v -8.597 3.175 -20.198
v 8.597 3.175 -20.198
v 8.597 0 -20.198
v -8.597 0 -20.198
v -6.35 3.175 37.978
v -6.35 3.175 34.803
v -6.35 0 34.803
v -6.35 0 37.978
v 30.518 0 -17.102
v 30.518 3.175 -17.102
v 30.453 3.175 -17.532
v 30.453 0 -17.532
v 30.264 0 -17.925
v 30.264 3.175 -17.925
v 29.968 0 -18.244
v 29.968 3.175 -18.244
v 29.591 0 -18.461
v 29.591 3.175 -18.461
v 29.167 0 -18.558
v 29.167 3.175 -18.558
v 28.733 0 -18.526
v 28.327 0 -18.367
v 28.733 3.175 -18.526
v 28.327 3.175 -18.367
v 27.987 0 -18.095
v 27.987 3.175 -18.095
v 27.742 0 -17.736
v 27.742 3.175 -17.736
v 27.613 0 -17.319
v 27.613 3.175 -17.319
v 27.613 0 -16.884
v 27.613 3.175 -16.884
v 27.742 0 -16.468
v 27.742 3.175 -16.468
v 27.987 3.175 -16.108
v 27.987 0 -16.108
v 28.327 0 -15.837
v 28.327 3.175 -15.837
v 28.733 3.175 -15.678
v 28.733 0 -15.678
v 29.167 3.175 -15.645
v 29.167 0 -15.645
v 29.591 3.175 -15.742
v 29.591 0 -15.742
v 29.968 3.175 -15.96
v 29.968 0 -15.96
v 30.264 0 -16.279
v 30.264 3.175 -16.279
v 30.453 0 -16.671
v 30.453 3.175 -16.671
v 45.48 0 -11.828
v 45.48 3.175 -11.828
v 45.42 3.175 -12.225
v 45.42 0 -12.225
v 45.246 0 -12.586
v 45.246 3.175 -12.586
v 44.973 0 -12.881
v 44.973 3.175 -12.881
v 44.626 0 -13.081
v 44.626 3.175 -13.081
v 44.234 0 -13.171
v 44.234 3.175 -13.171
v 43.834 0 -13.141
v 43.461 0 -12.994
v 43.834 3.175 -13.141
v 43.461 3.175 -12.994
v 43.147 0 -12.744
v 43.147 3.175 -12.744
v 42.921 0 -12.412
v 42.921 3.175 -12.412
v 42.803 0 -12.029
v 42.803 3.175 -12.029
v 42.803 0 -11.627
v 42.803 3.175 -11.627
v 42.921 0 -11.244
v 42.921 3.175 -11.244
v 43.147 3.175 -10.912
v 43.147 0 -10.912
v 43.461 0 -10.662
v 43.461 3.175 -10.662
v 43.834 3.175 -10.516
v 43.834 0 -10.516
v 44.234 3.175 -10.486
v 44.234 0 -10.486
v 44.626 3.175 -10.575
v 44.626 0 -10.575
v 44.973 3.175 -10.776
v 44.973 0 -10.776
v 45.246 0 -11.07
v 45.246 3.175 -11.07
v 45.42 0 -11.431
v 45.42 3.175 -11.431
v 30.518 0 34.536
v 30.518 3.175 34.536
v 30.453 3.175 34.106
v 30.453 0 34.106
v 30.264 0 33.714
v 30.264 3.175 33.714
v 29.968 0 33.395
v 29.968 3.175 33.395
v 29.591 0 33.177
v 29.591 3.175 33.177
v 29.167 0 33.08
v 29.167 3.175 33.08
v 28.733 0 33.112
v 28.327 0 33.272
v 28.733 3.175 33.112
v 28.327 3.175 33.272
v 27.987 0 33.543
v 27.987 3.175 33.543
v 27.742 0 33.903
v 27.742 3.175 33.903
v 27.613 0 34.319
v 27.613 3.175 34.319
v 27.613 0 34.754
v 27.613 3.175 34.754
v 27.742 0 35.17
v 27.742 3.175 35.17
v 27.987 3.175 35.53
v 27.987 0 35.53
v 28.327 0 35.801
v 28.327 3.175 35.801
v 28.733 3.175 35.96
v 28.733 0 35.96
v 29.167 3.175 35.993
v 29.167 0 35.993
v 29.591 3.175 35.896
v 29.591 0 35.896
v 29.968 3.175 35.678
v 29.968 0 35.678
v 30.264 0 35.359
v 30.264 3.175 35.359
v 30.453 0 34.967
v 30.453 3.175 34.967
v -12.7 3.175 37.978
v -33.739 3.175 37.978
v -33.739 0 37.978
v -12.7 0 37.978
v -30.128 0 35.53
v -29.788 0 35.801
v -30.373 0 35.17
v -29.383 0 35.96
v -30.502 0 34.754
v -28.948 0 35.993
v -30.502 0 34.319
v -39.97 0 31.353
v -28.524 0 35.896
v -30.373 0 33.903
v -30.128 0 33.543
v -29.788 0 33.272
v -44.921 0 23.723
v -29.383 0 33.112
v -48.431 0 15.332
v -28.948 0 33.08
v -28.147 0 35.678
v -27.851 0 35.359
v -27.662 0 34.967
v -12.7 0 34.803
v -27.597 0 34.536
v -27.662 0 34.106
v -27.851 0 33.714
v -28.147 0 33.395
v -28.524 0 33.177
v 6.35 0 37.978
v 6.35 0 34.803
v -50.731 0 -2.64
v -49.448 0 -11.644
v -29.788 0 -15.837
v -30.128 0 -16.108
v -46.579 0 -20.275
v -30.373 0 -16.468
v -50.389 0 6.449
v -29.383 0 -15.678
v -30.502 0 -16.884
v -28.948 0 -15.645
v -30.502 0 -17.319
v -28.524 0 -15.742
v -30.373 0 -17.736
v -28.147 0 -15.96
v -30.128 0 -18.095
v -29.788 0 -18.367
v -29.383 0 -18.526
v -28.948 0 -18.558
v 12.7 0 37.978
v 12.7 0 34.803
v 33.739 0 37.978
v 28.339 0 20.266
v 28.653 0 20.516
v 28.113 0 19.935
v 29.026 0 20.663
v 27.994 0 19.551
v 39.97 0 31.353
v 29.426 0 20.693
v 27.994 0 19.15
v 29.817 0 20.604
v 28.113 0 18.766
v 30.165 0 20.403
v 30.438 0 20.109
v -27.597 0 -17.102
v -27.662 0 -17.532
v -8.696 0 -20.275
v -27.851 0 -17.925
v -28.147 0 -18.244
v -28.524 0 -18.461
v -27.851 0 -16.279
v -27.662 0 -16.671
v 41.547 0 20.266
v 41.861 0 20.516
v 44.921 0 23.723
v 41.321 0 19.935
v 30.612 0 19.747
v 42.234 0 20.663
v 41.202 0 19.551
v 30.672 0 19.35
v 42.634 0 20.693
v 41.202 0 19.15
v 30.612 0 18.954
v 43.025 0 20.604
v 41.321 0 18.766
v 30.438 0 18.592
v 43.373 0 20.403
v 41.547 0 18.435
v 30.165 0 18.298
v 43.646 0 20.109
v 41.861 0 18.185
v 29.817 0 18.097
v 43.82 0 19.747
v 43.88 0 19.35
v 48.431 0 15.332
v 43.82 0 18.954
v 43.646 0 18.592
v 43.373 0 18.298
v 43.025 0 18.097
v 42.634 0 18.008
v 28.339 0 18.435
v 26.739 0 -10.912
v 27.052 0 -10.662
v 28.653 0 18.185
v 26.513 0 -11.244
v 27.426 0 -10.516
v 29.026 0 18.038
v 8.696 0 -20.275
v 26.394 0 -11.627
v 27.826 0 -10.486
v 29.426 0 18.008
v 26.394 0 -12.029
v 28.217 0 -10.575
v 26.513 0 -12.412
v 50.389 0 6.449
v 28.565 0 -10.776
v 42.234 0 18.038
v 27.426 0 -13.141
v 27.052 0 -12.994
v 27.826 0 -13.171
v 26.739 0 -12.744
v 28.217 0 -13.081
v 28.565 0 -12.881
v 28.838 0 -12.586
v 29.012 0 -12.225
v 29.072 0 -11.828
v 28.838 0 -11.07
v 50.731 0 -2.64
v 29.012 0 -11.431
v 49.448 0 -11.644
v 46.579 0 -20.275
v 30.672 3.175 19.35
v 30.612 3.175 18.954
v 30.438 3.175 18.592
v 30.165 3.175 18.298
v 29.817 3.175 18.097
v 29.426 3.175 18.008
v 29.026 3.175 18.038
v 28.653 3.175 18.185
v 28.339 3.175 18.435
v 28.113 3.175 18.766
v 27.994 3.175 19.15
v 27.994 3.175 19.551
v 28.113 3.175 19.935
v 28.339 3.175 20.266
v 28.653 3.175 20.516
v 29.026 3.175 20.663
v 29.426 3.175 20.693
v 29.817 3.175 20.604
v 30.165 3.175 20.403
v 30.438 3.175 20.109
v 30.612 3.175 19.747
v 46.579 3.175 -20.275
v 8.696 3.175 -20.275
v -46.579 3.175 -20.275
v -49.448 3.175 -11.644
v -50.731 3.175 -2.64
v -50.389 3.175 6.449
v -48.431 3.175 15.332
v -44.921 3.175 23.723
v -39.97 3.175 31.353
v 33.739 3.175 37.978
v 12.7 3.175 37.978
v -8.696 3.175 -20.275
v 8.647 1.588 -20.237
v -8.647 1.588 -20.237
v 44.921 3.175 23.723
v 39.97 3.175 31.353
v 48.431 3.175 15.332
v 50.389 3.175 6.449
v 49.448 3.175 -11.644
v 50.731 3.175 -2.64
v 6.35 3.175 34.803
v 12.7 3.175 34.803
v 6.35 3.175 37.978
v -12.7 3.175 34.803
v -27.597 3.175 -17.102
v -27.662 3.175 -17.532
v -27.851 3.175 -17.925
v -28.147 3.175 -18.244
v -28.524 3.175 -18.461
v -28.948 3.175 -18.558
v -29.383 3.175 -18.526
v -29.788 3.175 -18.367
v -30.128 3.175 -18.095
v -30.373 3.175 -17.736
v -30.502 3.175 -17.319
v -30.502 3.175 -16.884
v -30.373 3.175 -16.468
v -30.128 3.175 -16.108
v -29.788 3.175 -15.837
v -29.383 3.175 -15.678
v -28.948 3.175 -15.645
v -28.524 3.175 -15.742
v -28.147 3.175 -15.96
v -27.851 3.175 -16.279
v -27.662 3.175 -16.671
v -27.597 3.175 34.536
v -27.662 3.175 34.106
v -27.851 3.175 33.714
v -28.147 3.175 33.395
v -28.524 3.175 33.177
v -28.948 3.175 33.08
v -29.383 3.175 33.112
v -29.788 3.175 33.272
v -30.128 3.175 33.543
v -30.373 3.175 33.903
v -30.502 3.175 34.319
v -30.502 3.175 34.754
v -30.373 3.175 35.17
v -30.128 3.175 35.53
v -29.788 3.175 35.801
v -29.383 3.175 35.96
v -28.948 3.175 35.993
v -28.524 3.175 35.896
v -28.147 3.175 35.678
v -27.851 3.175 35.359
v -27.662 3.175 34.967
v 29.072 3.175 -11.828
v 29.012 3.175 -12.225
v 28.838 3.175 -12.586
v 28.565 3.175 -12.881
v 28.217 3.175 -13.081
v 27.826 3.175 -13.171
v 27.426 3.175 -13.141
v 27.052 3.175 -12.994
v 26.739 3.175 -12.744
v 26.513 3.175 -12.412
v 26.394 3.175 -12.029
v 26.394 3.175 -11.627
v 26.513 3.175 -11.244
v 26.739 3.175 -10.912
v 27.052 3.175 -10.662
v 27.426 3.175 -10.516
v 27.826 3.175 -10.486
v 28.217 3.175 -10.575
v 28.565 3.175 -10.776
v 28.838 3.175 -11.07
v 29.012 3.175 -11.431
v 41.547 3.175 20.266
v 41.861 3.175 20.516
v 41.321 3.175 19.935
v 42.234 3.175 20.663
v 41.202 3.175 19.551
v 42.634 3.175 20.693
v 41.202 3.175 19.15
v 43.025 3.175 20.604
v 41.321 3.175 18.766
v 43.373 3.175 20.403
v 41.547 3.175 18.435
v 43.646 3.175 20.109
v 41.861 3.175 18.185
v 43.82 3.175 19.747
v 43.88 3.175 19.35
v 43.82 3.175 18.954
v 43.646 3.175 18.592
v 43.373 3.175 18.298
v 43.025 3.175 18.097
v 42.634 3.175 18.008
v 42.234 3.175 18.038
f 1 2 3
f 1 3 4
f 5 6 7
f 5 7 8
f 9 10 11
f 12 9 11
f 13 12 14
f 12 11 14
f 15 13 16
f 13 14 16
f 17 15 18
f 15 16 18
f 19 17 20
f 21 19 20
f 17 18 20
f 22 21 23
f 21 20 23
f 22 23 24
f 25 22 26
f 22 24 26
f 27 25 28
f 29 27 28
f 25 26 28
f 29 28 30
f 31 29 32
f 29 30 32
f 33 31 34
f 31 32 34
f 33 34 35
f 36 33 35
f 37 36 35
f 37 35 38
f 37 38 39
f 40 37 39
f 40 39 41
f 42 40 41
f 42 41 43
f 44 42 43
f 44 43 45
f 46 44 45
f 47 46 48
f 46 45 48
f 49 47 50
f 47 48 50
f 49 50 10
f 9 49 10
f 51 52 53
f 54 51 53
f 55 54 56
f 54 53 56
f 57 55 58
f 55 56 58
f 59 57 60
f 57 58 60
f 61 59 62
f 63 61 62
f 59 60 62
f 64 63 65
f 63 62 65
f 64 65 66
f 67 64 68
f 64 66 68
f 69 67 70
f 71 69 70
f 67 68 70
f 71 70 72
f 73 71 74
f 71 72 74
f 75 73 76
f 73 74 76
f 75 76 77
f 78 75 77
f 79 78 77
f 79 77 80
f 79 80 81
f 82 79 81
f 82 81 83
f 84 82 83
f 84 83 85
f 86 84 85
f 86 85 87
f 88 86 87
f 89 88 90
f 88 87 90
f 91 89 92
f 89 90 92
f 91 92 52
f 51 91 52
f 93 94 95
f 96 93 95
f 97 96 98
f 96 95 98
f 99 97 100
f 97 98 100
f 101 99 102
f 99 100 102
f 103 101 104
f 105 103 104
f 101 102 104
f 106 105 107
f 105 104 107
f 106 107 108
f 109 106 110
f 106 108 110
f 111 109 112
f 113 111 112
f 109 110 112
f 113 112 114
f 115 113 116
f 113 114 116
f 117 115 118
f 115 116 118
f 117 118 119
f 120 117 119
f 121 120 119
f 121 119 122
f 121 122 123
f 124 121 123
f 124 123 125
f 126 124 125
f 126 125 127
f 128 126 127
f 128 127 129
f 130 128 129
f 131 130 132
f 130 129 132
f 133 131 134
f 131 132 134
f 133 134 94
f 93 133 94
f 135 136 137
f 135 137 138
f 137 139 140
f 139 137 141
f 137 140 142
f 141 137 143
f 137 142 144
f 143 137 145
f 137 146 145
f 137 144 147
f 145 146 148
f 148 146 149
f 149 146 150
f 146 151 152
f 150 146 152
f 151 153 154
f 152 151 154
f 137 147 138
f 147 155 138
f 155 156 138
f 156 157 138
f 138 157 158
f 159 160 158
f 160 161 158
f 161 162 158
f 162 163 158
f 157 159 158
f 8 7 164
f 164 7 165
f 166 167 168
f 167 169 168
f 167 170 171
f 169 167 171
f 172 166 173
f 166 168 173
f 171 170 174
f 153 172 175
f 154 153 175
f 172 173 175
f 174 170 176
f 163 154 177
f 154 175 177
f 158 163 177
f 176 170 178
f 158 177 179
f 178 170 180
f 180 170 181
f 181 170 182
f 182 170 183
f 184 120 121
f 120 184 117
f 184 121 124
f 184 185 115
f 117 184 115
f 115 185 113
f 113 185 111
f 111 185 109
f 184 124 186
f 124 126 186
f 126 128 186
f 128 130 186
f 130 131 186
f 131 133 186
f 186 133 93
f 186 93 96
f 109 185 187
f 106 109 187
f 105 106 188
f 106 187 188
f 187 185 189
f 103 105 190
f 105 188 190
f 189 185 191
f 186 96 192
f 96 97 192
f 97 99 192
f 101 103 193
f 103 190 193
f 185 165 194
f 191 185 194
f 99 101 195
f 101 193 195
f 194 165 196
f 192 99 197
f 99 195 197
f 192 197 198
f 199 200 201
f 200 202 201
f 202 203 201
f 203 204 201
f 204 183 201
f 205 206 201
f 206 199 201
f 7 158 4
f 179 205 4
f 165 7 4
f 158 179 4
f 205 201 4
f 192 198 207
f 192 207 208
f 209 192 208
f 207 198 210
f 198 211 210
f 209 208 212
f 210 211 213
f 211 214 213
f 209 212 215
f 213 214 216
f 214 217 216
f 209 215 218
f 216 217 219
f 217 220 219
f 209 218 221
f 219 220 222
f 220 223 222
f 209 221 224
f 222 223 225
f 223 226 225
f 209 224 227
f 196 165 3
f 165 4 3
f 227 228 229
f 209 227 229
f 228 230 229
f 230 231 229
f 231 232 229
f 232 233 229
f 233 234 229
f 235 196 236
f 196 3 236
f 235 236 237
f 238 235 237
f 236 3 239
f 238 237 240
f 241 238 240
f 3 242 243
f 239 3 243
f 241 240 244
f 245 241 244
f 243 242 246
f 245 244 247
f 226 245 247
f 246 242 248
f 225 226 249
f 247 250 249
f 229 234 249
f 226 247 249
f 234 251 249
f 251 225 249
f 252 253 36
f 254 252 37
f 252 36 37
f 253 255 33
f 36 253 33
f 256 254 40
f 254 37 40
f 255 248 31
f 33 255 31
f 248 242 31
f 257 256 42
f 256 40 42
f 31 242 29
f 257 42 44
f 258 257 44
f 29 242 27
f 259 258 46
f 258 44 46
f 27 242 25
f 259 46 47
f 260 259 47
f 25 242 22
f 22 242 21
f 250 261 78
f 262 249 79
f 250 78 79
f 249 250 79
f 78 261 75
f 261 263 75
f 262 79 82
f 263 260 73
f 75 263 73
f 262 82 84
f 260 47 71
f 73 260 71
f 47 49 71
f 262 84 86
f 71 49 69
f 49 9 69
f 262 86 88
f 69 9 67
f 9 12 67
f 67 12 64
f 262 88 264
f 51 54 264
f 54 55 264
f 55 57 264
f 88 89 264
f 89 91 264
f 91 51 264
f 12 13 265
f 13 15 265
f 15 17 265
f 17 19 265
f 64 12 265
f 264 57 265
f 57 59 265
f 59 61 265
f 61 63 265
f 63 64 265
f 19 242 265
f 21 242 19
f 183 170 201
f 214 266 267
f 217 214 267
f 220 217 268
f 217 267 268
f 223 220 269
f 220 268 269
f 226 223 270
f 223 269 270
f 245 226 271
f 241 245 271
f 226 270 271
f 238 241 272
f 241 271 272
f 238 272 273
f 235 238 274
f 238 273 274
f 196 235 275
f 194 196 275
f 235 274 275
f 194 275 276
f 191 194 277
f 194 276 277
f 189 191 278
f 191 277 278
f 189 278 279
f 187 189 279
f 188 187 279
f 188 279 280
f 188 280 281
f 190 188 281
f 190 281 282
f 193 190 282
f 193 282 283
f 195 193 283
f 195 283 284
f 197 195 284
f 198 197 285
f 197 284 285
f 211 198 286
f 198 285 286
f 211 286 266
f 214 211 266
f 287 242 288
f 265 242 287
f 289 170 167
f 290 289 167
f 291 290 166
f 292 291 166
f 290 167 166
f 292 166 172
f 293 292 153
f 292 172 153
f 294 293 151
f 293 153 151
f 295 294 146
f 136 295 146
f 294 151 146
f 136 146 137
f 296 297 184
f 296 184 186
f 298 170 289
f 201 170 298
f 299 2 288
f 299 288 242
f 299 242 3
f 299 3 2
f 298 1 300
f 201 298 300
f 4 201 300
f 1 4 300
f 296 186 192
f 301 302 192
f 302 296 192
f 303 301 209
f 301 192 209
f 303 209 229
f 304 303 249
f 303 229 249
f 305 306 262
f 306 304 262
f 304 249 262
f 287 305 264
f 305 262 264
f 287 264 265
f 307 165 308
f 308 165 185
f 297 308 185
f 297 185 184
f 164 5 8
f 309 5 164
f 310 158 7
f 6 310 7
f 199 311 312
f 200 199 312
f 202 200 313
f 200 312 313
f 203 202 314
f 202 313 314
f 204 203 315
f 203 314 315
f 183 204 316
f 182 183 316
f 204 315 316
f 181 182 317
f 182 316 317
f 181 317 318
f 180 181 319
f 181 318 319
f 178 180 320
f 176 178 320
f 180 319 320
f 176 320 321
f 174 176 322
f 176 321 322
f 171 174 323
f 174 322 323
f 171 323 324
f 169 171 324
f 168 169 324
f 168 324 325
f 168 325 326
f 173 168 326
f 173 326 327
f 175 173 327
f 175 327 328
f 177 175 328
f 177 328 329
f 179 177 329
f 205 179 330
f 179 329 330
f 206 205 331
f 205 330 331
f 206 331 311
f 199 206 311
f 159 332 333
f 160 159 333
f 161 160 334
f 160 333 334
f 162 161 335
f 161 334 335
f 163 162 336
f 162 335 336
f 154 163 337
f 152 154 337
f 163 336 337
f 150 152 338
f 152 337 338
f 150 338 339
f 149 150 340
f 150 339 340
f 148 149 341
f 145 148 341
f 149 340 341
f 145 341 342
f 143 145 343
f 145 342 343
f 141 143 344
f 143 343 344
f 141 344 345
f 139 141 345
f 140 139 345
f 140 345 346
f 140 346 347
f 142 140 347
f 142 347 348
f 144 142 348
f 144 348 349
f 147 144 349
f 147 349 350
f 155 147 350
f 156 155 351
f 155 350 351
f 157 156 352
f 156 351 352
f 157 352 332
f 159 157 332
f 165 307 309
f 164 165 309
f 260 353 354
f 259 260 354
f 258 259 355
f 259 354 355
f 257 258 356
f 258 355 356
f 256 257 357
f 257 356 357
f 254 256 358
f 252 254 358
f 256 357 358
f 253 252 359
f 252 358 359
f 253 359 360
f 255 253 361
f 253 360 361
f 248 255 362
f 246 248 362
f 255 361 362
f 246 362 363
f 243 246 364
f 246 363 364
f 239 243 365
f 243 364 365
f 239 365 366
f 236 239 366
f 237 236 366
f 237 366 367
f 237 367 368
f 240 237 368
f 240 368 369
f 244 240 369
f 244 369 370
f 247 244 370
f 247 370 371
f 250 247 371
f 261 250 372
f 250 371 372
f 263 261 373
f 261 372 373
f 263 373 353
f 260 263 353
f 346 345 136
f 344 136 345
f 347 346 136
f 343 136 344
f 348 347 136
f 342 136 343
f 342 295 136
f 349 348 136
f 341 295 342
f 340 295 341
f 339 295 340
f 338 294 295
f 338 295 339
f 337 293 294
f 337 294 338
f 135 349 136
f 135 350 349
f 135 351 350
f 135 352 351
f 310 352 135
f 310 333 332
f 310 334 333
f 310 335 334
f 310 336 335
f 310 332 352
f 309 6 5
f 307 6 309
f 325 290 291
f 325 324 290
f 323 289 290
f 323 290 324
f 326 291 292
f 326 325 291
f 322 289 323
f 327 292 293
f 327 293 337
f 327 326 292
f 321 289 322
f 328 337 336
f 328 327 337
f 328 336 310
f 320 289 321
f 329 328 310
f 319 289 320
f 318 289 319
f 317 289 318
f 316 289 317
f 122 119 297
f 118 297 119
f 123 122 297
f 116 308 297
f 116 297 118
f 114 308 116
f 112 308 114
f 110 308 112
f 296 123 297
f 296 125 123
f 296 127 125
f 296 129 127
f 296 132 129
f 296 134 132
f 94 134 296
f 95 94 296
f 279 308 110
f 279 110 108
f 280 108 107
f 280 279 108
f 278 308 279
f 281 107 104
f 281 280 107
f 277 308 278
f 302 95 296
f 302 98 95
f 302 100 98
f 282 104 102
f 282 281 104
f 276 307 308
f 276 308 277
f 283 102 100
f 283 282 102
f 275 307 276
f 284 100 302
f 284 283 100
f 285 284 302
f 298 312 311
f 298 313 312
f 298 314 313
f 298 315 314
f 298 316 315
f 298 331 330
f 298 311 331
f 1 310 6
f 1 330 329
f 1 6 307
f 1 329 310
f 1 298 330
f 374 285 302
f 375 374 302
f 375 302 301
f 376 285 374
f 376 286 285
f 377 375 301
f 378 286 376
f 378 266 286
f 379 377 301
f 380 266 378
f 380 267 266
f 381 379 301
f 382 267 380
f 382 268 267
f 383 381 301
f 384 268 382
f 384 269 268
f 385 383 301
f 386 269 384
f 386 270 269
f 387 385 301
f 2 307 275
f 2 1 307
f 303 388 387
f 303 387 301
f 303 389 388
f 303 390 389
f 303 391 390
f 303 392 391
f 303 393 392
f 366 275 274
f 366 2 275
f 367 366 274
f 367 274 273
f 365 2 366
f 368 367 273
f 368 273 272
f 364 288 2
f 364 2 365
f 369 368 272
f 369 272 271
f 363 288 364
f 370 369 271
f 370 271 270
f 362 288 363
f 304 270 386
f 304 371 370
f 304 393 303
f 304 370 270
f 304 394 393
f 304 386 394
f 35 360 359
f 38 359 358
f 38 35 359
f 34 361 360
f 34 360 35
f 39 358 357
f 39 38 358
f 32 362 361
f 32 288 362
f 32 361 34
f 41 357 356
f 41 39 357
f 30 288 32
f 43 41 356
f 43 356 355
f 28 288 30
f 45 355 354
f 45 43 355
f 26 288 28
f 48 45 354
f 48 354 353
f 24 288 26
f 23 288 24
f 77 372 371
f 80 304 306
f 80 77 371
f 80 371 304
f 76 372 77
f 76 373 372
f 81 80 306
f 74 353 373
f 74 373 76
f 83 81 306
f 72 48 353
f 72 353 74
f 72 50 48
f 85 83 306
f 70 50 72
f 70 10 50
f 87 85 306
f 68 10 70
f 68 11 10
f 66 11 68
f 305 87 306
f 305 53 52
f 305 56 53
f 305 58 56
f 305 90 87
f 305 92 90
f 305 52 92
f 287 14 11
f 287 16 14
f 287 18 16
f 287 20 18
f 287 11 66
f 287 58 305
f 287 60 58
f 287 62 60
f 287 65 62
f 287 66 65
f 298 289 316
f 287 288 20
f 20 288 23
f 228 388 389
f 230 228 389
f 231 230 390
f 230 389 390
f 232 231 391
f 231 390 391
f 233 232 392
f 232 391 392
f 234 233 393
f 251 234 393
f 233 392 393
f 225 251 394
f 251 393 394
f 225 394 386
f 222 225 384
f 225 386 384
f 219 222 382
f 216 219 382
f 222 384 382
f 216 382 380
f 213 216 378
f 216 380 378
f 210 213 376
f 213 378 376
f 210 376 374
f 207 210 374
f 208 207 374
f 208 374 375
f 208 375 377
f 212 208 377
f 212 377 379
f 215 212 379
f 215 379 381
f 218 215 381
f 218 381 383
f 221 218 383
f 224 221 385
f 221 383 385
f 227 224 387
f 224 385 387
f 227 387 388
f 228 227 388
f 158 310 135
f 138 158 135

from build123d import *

# Parameters (mm, degrees)
SKETCH1_R           = 50.8
BOSS_EXTRUDE1_DEPTH = 3.175
SKETCH2_W           = 114.887790664
SKETCH2_H           = 17.737062418
CUT_EXTRUDE1_DEPTH  = 3.175
SKETCH6_R           = 1.4605
CUT_EXTRUDE2_DEPTH  = 3.175
SKETCH7_W           = 120.831003793
SKETCH7_H           = 28.526712532
CUT_EXTRUDE3_DEPTH  = 3.175
SKETCH8_W           = 6.35
SKETCH8_H           = 3.175
CUT_EXTRUDE4_DEPTH  = 3.175
SKETCH9_R           = 1.3462
CUT_EXTRUDE5_DEPTH  = 3.175


with BuildPart() as part:
    # Sketch1 → Boss-Extrude1 (new body)
    with BuildSketch(Plane(origin=(0, 0, 0), x_dir=(1, 0, 0), z_dir=(0, 1, 0))):
        Circle(SKETCH1_R)
    extrude(amount=BOSS_EXTRUDE1_DEPTH)

    # Sketch2 → Cut-Extrude1 (cut)
    with BuildSketch(Plane(origin=(0, 3.175, 0), x_dir=(1, 0, 0), z_dir=(0, 1, 0))):
        with BuildLine():
            Line((-53.141111112, 55.715142418), (61.746679552, 55.715142418))
            Line((61.746679552, 55.715142418), (61.746679552, 37.97808))
            Line((61.746679552, 37.97808), (17.466405486, 37.97808))
            add(Edge.make_bspline(
                [(17.466405486, 37.97808), (17.038082166, 26.714286782), (8.597103322, 20.19808)],
                knots=[0, 0, 0, 1, 1, 1], degree=2))
            Line((8.597103322, 20.19808), (-8.597103322, 20.19808))
            add(Edge.make_bspline(
                [(-17.466405486, 37.97808), (-17.038082166, 26.714286782), (-8.597103322, 20.19808)],
                knots=[0, 0, 0, 1, 1, 1], degree=2))
            Line((-17.466405486, 37.97808), (-53.141111112, 37.97808))
            Line((-53.141111112, 37.97808), (-53.141111112, 55.715142418))
        make_face()
        with Locations((4.30278422, -46.846611209)):
            Rectangle(SKETCH2_W, SKETCH2_H)
    extrude(amount=-CUT_EXTRUDE1_DEPTH, mode=Mode.SUBTRACT)

    # Sketch6 → Cut-Extrude2 (cut)
    with BuildSketch(Plane(origin=(0, 3.175, 0), x_dir=(1, 0, 0), z_dir=(0, 1, 0))):
        with Locations((-29.0576, 17.10182)):
            Circle(SKETCH6_R)
        with Locations((29.0576, 17.10182)):
            Circle(SKETCH6_R)
        with Locations((29.0576, -34.53638)):
            Circle(SKETCH6_R)
        with Locations((-29.0576, -34.53638)):
            Circle(SKETCH6_R)
    extrude(amount=-CUT_EXTRUDE2_DEPTH, mode=Mode.SUBTRACT)

    # Sketch7 → Cut-Extrude3 (cut)
    with BuildSketch(Plane.XZ):
        with Locations((-2.634885915, -34.53847722)):
            Rectangle(SKETCH7_W, SKETCH7_H)
    extrude(amount=-CUT_EXTRUDE3_DEPTH, mode=Mode.SUBTRACT)

    # Sketch8 → Cut-Extrude4 (cut)
    with BuildSketch(Plane.XZ):
        with Locations((-9.525, 36.39058)):
            Rectangle(SKETCH8_W, SKETCH8_H)
        with Locations((9.525, 36.39058)):
            Rectangle(SKETCH8_W, SKETCH8_H)
    extrude(amount=-CUT_EXTRUDE4_DEPTH, mode=Mode.SUBTRACT)

    # Sketch9 → Cut-Extrude5 (cut)
    with BuildSketch(Plane(origin=(0, 3.175, 0), x_dir=(1, 0, 0), z_dir=(0, 1, 0))):
        with Locations((27.725400673, 11.828091507)):
            Circle(SKETCH9_R)
        with Locations((44.133800673, 11.828091507)):
            Circle(SKETCH9_R)
        with Locations((42.533600673, -19.350408493)):
            Circle(SKETCH9_R)
        with Locations((29.325600673, -19.350408493)):
            Circle(SKETCH9_R)
    extrude(amount=-CUT_EXTRUDE5_DEPTH, mode=Mode.SUBTRACT)


solid = part.part
